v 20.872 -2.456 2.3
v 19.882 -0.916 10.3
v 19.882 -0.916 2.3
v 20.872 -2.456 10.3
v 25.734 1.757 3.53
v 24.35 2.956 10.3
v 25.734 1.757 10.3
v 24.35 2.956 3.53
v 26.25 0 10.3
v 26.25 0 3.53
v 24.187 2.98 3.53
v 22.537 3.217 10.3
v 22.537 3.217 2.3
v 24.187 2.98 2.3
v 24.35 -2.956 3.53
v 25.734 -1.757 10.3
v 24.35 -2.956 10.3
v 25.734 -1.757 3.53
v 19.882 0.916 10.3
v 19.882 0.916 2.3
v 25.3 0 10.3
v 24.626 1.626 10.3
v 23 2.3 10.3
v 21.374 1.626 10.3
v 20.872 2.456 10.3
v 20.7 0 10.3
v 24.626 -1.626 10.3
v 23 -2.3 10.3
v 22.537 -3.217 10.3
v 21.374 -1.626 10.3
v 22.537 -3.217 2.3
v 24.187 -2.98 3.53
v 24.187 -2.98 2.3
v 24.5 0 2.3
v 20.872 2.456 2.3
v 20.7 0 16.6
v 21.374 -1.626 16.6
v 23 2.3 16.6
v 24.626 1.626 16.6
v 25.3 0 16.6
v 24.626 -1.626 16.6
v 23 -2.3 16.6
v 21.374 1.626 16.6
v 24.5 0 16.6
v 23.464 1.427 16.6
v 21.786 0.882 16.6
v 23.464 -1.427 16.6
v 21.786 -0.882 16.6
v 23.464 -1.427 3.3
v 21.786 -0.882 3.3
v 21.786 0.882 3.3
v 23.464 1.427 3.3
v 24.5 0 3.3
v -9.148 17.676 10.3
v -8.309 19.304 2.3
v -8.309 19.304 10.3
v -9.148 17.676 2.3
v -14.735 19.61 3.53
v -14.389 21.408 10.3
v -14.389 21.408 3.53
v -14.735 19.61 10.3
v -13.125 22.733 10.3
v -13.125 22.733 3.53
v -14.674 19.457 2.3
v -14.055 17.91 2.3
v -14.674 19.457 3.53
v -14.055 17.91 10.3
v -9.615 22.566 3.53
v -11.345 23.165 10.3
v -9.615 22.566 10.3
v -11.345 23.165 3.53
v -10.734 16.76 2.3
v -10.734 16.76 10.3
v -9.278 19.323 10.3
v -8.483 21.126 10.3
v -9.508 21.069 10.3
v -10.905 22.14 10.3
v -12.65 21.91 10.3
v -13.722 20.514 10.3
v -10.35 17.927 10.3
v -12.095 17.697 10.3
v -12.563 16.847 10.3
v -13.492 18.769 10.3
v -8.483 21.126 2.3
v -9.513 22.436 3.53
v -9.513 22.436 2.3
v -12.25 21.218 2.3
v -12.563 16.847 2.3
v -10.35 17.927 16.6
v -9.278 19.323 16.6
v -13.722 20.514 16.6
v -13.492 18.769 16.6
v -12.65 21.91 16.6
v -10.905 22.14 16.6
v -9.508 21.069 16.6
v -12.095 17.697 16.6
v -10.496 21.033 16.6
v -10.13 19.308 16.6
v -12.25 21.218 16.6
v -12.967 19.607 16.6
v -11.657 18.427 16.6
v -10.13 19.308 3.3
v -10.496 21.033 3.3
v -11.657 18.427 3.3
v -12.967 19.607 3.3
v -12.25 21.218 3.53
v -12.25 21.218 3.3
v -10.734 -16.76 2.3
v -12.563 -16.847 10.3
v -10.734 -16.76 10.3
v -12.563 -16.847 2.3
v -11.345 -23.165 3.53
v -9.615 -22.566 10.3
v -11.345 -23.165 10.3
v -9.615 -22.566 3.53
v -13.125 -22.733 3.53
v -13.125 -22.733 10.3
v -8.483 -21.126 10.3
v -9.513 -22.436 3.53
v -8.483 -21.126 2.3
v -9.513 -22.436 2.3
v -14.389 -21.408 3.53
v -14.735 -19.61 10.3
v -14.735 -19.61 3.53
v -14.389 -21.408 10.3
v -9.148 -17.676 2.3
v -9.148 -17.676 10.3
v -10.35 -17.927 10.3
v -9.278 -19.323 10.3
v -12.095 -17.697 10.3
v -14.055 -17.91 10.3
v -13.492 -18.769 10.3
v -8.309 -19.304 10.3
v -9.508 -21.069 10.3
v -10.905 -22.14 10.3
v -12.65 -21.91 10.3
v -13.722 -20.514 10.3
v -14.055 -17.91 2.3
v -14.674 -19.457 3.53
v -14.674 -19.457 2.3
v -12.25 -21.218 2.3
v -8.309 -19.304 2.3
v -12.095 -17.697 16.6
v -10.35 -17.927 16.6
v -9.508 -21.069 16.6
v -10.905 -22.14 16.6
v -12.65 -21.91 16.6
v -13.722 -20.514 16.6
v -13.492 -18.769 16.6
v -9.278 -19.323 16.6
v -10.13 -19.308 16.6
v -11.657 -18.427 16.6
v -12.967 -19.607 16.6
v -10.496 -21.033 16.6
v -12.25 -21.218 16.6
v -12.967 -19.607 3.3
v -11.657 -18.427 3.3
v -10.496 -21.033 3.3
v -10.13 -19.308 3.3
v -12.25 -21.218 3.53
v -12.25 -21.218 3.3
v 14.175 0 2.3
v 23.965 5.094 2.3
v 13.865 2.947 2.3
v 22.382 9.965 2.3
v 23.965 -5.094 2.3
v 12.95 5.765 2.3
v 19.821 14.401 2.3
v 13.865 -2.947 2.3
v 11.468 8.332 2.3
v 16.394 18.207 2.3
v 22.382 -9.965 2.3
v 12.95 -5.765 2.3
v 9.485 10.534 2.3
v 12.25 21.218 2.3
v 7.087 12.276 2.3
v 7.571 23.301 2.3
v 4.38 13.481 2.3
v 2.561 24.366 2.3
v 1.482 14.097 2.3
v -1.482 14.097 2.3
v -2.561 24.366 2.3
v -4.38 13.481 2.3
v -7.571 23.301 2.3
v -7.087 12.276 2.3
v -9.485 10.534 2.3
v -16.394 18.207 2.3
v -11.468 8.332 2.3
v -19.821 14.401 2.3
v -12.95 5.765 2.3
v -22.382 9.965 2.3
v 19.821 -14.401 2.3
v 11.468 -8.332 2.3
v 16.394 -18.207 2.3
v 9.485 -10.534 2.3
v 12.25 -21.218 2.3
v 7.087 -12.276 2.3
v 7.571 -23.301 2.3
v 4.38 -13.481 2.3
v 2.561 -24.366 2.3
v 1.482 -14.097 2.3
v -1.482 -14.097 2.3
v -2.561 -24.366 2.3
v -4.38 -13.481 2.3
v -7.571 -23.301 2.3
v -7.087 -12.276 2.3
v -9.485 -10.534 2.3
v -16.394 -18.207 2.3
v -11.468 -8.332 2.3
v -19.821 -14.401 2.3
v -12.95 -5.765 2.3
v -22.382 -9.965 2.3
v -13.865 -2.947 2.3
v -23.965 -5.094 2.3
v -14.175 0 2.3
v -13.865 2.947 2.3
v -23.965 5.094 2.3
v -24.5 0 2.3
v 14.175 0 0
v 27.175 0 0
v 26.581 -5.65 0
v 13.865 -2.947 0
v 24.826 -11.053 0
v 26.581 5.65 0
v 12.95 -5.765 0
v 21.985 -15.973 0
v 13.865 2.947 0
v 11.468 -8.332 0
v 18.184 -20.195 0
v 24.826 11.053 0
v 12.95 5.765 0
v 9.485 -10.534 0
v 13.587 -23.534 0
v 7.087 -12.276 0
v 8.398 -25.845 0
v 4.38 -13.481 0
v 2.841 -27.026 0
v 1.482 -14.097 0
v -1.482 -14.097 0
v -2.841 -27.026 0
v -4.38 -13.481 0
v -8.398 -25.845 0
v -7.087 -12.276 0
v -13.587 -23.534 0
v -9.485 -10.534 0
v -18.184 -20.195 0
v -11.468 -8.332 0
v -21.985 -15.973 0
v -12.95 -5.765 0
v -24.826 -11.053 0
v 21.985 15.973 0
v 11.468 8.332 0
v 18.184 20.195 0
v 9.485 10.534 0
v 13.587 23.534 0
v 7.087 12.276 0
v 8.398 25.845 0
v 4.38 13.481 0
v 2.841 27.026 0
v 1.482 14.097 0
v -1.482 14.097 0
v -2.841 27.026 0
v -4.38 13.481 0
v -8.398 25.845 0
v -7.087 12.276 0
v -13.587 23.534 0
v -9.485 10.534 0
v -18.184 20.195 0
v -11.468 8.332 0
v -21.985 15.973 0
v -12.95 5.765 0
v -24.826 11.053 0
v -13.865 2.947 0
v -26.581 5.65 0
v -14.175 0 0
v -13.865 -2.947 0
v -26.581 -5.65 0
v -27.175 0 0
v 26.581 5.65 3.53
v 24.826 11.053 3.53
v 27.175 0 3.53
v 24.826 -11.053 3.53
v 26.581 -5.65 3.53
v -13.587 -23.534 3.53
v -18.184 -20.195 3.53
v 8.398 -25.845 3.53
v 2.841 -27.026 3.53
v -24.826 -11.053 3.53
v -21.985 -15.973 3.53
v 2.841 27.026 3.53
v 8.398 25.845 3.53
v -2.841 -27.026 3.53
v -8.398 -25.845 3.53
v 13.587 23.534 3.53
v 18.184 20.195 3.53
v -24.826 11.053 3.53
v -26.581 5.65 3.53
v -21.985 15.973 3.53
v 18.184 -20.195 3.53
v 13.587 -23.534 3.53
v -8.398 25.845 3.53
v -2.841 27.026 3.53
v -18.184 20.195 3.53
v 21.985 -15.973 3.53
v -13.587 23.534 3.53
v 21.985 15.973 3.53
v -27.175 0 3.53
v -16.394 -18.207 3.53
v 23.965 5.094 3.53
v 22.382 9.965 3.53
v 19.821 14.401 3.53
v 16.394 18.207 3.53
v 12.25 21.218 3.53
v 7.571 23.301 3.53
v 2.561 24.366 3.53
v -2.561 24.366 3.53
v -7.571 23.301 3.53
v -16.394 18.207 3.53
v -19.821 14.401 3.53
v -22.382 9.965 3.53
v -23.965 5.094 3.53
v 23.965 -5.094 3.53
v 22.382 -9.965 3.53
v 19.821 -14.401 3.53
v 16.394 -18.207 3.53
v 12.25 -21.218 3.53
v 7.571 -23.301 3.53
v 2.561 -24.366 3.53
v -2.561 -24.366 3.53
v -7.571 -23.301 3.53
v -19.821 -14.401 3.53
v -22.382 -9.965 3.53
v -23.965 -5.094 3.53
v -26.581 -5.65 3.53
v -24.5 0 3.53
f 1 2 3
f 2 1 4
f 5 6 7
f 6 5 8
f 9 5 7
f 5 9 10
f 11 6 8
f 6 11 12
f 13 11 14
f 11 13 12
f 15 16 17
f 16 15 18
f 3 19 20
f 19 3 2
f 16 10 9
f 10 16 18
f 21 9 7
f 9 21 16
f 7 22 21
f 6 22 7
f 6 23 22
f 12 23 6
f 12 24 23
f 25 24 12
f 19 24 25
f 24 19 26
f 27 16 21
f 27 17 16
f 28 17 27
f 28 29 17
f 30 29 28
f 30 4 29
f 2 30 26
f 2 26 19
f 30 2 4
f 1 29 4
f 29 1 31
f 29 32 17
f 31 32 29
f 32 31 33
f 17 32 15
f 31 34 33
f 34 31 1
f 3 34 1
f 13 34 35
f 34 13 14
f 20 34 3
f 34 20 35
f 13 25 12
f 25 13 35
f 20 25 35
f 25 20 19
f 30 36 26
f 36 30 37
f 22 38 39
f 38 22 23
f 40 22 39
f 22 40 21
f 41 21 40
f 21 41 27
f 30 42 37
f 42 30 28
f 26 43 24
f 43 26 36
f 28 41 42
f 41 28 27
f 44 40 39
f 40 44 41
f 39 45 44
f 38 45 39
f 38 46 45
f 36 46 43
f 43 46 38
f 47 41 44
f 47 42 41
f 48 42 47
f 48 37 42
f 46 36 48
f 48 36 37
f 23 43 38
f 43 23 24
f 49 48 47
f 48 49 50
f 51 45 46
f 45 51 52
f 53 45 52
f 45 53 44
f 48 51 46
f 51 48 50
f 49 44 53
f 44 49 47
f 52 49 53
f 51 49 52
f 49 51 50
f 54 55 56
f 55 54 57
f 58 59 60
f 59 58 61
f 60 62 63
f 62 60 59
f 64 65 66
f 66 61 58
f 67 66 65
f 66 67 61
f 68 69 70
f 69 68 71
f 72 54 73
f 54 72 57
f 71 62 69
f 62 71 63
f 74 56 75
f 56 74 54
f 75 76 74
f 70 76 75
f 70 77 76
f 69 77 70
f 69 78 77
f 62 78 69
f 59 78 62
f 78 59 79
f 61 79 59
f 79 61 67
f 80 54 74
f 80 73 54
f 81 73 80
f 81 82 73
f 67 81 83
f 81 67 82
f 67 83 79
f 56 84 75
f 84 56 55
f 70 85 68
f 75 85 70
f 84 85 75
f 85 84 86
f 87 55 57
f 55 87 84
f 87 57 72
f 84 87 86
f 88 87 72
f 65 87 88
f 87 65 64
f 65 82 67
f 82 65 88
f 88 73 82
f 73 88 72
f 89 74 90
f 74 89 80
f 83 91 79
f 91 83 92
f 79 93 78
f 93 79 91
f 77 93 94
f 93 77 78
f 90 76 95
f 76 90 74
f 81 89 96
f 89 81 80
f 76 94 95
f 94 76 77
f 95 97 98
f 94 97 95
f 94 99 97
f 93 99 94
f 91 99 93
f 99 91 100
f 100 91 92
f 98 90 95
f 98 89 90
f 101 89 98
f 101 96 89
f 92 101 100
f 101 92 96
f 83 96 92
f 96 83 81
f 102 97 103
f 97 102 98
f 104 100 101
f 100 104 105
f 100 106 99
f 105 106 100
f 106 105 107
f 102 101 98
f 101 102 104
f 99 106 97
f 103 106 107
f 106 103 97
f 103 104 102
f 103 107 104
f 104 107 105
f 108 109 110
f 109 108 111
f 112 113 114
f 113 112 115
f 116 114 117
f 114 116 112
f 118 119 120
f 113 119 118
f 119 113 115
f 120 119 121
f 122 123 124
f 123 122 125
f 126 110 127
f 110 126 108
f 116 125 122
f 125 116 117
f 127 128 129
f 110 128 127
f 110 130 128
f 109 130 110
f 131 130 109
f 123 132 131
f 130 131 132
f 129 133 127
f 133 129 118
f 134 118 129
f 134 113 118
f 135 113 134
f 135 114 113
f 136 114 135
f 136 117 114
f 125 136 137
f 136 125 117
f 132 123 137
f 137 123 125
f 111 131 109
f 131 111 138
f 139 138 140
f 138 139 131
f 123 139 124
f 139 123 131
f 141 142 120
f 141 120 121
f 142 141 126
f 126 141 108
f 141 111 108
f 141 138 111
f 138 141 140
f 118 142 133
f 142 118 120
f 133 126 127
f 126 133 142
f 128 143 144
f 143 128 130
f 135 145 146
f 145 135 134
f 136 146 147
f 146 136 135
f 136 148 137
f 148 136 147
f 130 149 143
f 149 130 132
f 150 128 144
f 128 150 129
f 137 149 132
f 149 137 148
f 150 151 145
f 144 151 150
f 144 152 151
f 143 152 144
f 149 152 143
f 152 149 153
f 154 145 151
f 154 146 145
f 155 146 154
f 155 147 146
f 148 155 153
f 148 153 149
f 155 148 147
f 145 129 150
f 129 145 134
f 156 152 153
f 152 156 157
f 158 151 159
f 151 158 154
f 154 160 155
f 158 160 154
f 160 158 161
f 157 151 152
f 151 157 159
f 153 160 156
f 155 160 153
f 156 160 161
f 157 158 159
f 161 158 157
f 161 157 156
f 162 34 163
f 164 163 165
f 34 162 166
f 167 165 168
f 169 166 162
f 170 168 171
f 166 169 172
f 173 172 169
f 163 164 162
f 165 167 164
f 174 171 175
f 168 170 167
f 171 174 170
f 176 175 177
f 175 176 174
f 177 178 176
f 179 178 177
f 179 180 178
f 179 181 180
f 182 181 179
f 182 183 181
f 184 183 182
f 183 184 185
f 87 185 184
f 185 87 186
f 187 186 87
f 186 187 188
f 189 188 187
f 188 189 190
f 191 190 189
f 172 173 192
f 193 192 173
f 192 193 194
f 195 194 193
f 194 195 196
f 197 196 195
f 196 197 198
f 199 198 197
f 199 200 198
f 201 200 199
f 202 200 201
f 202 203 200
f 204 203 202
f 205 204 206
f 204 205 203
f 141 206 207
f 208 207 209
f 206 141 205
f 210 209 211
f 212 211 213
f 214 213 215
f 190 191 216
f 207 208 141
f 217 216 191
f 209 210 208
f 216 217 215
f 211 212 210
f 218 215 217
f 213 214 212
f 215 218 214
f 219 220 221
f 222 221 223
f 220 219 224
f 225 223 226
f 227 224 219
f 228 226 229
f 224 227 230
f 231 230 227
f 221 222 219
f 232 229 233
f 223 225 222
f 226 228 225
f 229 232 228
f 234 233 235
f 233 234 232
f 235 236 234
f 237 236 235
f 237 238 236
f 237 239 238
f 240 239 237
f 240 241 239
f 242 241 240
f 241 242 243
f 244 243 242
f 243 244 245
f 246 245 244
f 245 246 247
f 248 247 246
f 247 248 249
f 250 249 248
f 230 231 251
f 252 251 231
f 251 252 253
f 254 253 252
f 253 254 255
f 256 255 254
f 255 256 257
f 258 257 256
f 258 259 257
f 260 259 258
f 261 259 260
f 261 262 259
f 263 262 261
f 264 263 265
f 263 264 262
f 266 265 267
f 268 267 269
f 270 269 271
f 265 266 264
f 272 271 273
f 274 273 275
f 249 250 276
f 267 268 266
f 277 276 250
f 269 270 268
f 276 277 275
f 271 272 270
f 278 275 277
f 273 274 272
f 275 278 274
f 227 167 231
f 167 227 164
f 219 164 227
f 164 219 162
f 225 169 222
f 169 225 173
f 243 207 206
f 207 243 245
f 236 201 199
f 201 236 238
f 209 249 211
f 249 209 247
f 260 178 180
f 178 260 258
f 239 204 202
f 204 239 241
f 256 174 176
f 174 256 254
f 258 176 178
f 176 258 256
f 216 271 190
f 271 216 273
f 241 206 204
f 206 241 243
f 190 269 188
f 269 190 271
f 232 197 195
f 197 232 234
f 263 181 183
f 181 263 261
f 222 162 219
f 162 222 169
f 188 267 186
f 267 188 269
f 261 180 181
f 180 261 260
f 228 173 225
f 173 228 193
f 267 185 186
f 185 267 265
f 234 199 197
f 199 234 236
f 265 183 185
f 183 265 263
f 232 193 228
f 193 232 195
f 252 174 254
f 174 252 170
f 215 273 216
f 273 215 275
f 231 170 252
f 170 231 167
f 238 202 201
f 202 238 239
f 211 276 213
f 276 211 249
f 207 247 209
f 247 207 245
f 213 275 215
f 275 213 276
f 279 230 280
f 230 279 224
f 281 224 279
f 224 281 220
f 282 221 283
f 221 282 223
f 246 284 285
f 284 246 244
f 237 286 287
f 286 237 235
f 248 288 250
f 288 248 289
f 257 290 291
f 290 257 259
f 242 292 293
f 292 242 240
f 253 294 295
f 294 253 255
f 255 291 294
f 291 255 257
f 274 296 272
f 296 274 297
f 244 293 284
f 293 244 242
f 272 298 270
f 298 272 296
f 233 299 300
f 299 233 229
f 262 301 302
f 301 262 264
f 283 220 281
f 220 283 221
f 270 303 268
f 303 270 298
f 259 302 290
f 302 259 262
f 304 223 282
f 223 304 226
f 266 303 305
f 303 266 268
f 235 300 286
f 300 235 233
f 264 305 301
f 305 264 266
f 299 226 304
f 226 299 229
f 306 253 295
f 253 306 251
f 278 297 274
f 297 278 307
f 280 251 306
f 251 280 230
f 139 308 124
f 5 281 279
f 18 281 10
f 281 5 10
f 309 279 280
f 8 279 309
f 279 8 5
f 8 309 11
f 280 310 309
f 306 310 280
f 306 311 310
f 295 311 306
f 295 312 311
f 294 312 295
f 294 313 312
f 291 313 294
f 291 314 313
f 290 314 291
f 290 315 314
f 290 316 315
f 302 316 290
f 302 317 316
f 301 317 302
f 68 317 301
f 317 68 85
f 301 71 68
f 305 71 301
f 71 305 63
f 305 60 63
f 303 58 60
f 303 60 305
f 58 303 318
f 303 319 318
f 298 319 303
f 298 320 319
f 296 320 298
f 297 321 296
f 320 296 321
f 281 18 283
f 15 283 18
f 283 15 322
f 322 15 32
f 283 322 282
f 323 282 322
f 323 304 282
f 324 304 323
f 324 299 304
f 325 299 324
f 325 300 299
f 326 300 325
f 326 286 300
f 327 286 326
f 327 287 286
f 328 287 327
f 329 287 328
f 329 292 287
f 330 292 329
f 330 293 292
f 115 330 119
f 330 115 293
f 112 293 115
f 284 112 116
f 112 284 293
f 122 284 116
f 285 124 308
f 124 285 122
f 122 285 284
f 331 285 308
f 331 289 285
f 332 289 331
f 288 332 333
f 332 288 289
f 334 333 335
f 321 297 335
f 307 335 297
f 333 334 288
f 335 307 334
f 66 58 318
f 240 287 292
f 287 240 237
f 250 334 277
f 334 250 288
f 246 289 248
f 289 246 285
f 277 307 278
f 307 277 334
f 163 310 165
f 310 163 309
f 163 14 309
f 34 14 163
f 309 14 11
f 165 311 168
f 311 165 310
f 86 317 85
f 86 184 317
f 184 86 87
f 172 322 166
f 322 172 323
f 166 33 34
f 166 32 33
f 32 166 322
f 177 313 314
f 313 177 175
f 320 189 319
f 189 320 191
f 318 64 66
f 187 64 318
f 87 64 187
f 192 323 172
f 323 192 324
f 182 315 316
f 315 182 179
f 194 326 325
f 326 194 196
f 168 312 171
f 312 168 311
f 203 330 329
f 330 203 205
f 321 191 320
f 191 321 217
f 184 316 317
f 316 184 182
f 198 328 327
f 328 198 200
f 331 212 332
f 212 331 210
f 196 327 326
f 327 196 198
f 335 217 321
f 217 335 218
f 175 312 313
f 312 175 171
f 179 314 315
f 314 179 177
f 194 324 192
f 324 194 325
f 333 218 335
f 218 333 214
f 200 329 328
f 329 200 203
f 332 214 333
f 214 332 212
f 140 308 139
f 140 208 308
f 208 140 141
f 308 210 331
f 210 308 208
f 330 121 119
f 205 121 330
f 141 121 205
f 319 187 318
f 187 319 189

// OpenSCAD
// "scooter part from the 80s"
// request from makexyz
// by knarfishness for dieselpoweredrobotics.com

outer_cyl_od = 54.35;
outer_cyl_id = 49;
outer_cyl_height = 3.53;

inner_cyl_od = 50;
inner_cyl_id = 26;
inner_cyl_height = 2.3;

inner_hole = 26;

peg_l1_od = 6.5;
peg_l1_height = 8;

peg_l2_od = 4.6;
peg_l2_height = 6.3;

peghole_od = 3;

module outer_cyl()
{
	difference()
	{
		cylinder(outer_cyl_height, (outer_cyl_od/2), (outer_cyl_od/2));
		translate([0,0,-1])
		cylinder(outer_cyl_height+2, outer_cyl_id/2, outer_cyl_id/2);
	}
	
}

module inner_cyl()
{
	difference()
	{
		cylinder(inner_cyl_height, inner_cyl_od/2, inner_cyl_od/2);
		translate([0,0,-1])
		cylinder(outer_cyl_height+2, (outer_cyl_od/2)-inner_hole/2, (outer_cyl_od/2)-inner_hole/2);
	}
	
}

module peg_outer()
{
	cylinder(peg_l1_height, peg_l1_od/2, peg_l1_od/2);

	translate([0,0,peg_l1_height])
	cylinder(peg_l2_height, peg_l2_od/2, peg_l2_od/2);
}

module peg()
{
	translate([0,0,inner_cyl_height])
	difference()
	{
		peg_outer();
		translate([0,0,1])
		cylinder(peg_l1_height+peg_l2_height, peghole_od/2, peghole_od/2);
	}
}

rotate([0,0,120])
{
	translate([inner_cyl_id-3,0,0])
	peg();
}

rotate([0,0,240])
{
	translate([inner_cyl_id-3,0,0])
	peg();
}

translate([inner_cyl_id-3,0,0])
peg();


// translate([0,10,0])
// peg();

// translate([-10,-10,0])
// peg();








module scooter_part()
{
	inner_cyl();
	outer_cyl();
}

scooter_part();
